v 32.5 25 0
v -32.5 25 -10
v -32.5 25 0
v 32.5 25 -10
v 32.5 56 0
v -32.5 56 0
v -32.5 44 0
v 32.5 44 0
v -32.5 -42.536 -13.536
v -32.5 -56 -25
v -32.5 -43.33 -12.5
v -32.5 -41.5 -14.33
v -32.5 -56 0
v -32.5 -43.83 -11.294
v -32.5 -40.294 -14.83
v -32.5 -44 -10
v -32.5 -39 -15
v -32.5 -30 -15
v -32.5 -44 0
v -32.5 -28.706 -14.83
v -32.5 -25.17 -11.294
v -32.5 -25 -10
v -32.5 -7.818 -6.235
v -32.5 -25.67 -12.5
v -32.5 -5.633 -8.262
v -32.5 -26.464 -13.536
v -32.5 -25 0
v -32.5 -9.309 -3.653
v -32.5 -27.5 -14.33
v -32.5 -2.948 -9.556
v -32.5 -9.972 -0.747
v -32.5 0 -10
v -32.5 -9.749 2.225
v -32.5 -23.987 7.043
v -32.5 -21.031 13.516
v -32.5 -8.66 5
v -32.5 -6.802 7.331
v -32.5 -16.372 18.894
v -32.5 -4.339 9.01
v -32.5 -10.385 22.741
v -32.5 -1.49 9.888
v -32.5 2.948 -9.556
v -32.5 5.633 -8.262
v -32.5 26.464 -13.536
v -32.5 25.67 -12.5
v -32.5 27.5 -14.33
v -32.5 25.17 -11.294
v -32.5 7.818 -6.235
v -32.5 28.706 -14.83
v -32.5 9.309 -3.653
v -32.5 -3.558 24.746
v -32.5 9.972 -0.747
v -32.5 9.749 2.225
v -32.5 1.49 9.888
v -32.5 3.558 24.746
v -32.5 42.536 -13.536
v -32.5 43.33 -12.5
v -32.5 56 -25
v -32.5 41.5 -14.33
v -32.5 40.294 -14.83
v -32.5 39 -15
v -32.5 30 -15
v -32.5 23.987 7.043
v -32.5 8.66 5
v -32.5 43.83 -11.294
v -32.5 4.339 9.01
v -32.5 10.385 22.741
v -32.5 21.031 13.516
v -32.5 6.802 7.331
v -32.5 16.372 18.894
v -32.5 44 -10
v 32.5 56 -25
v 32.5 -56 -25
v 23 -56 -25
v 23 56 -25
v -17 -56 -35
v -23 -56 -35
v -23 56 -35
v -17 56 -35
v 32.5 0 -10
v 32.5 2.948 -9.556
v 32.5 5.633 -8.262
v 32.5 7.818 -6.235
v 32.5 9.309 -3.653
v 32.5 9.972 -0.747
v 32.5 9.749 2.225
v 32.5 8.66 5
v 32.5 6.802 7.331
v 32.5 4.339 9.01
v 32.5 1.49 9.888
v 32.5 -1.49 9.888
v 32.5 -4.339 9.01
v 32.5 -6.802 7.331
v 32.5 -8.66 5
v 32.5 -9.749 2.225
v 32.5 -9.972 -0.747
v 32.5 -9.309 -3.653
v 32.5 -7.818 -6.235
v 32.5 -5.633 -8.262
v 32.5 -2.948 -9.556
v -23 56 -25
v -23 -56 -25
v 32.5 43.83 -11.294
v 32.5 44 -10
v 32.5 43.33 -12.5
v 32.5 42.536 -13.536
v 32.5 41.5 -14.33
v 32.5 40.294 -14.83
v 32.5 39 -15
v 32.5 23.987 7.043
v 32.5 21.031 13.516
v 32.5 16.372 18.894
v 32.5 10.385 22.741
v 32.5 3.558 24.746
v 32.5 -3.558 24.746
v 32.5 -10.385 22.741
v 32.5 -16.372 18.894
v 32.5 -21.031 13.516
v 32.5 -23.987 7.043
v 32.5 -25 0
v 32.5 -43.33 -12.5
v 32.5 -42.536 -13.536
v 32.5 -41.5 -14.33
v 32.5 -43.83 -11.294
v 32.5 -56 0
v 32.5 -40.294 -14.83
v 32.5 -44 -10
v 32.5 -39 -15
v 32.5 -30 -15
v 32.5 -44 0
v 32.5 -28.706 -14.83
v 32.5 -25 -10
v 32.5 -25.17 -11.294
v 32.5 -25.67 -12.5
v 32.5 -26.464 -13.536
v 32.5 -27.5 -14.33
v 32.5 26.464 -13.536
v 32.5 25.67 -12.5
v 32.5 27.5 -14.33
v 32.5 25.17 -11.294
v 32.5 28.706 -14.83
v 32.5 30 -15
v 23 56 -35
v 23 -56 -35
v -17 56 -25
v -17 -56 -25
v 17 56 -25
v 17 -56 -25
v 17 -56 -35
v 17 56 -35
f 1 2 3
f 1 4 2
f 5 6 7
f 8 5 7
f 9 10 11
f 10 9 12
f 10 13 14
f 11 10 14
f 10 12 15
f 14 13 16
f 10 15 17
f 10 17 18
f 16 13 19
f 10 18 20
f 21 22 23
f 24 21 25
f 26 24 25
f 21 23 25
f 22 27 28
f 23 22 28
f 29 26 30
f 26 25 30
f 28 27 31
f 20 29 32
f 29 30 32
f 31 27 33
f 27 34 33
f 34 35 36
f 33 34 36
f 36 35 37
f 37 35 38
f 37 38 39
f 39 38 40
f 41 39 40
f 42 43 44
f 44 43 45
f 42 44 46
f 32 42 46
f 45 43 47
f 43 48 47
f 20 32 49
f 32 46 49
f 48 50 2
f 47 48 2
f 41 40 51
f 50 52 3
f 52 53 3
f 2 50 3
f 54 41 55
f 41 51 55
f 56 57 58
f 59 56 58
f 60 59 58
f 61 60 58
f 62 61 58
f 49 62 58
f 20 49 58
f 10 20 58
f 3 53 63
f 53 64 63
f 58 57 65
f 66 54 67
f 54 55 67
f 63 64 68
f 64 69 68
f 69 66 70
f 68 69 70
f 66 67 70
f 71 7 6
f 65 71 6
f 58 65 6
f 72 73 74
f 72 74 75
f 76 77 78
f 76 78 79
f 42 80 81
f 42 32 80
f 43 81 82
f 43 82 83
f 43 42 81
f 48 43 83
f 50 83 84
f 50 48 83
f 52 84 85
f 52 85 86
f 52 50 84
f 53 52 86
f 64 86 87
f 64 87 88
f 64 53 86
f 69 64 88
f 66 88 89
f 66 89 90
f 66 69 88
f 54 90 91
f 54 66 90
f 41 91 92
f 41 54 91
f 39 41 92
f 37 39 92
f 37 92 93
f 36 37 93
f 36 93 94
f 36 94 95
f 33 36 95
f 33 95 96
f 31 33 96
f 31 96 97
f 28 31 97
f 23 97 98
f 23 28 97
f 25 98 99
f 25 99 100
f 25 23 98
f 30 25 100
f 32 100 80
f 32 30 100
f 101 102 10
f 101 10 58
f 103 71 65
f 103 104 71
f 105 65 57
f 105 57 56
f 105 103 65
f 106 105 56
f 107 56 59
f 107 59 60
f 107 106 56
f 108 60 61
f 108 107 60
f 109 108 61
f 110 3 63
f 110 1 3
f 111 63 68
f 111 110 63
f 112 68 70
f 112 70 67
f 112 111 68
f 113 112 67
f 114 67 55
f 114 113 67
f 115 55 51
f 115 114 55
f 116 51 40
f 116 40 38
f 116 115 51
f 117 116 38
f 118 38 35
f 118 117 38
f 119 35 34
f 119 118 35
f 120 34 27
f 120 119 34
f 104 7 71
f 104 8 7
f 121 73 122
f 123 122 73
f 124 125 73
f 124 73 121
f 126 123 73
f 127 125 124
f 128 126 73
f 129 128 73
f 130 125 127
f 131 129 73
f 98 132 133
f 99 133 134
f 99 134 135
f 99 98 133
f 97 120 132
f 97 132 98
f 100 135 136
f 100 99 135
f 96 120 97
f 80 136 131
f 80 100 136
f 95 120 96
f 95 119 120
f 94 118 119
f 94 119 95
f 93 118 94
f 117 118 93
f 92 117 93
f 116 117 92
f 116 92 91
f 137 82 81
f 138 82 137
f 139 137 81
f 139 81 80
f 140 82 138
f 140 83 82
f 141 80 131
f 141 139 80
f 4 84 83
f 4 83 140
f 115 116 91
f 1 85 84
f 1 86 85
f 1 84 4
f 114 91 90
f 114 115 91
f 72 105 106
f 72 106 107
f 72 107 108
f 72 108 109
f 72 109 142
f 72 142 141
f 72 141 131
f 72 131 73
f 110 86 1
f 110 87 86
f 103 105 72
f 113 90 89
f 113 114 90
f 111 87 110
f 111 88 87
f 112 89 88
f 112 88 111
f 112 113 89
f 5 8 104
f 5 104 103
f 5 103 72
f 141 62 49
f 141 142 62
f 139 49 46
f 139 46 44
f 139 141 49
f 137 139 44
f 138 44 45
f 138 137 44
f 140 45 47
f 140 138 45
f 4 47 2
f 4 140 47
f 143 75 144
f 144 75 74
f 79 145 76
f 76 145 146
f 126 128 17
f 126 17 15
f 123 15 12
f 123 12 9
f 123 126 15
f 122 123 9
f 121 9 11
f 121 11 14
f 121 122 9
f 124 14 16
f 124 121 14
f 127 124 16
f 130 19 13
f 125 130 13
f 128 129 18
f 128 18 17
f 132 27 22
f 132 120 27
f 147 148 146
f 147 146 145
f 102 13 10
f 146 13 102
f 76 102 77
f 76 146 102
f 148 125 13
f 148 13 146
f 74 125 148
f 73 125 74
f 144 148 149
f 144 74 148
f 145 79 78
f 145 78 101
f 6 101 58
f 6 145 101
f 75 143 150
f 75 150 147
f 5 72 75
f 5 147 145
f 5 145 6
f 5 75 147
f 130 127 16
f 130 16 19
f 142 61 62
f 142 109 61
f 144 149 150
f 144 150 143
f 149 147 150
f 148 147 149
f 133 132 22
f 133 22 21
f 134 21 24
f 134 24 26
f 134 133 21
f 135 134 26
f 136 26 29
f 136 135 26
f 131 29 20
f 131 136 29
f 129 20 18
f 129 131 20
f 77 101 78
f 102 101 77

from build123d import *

# Parameters (mm, degrees)
SKETCH1_R           = 10
BOSS_EXTRUDE1_DEPTH = 32.5
SKETCH2_W           = 6
SKETCH2_H           = 112
BOSS_EXTRUDE2_DEPTH = 10


with BuildPart() as part:
    # Sketch1 → Boss-Extrude1 (new, symmetric)
    with BuildSketch(Plane.YZ):
        with BuildLine():
            Line((-25, 0), (-25, -10))
            ThreePointArc((-25, -10), (-26.464466094, -13.535533906), (-30, -15))
            Line((-30, -15), (-39, -15))
            ThreePointArc((-39, -15), (-42.535533906, -13.535533906), (-44, -10))
            Line((-44, -10), (-44, 0))
            Line((-44, 0), (-56, 0))
            Line((-56, 0), (-56, -25))
            Line((-56, -25), (56, -25))
            Line((56, -25), (56, 0))
            Line((56, 0), (44, 0))
            Line((44, 0), (44, -10))
            ThreePointArc((44, -10), (42.535533906, -13.535533906), (39, -15))
            Line((39, -15), (30, -15))
            ThreePointArc((30, -15), (26.464466094, -13.535533906), (25, -10))
            Line((25, -10), (25, 0))
            ThreePointArc((25, 0), (0, 25), (-25, 0))
        make_face()
        with Locations(Location((0, 0, 0), (0, 0, 270))):
            Circle(SKETCH1_R, mode=Mode.SUBTRACT)
    extrude(amount=BOSS_EXTRUDE1_DEPTH, both=True)

    # Sketch2 → Boss-Extrude2 (add)
    with BuildSketch(Plane(origin=(0, 0, -25), x_dir=(1, 0, 0), z_dir=(0, 0, -1))):
        with Locations((-20, 0)):
            Rectangle(SKETCH2_W, SKETCH2_H)
        with Locations((20, 0)):
            Rectangle(SKETCH2_W, SKETCH2_H)
    extrude(amount=BOSS_EXTRUDE2_DEPTH)


solid = part.part
